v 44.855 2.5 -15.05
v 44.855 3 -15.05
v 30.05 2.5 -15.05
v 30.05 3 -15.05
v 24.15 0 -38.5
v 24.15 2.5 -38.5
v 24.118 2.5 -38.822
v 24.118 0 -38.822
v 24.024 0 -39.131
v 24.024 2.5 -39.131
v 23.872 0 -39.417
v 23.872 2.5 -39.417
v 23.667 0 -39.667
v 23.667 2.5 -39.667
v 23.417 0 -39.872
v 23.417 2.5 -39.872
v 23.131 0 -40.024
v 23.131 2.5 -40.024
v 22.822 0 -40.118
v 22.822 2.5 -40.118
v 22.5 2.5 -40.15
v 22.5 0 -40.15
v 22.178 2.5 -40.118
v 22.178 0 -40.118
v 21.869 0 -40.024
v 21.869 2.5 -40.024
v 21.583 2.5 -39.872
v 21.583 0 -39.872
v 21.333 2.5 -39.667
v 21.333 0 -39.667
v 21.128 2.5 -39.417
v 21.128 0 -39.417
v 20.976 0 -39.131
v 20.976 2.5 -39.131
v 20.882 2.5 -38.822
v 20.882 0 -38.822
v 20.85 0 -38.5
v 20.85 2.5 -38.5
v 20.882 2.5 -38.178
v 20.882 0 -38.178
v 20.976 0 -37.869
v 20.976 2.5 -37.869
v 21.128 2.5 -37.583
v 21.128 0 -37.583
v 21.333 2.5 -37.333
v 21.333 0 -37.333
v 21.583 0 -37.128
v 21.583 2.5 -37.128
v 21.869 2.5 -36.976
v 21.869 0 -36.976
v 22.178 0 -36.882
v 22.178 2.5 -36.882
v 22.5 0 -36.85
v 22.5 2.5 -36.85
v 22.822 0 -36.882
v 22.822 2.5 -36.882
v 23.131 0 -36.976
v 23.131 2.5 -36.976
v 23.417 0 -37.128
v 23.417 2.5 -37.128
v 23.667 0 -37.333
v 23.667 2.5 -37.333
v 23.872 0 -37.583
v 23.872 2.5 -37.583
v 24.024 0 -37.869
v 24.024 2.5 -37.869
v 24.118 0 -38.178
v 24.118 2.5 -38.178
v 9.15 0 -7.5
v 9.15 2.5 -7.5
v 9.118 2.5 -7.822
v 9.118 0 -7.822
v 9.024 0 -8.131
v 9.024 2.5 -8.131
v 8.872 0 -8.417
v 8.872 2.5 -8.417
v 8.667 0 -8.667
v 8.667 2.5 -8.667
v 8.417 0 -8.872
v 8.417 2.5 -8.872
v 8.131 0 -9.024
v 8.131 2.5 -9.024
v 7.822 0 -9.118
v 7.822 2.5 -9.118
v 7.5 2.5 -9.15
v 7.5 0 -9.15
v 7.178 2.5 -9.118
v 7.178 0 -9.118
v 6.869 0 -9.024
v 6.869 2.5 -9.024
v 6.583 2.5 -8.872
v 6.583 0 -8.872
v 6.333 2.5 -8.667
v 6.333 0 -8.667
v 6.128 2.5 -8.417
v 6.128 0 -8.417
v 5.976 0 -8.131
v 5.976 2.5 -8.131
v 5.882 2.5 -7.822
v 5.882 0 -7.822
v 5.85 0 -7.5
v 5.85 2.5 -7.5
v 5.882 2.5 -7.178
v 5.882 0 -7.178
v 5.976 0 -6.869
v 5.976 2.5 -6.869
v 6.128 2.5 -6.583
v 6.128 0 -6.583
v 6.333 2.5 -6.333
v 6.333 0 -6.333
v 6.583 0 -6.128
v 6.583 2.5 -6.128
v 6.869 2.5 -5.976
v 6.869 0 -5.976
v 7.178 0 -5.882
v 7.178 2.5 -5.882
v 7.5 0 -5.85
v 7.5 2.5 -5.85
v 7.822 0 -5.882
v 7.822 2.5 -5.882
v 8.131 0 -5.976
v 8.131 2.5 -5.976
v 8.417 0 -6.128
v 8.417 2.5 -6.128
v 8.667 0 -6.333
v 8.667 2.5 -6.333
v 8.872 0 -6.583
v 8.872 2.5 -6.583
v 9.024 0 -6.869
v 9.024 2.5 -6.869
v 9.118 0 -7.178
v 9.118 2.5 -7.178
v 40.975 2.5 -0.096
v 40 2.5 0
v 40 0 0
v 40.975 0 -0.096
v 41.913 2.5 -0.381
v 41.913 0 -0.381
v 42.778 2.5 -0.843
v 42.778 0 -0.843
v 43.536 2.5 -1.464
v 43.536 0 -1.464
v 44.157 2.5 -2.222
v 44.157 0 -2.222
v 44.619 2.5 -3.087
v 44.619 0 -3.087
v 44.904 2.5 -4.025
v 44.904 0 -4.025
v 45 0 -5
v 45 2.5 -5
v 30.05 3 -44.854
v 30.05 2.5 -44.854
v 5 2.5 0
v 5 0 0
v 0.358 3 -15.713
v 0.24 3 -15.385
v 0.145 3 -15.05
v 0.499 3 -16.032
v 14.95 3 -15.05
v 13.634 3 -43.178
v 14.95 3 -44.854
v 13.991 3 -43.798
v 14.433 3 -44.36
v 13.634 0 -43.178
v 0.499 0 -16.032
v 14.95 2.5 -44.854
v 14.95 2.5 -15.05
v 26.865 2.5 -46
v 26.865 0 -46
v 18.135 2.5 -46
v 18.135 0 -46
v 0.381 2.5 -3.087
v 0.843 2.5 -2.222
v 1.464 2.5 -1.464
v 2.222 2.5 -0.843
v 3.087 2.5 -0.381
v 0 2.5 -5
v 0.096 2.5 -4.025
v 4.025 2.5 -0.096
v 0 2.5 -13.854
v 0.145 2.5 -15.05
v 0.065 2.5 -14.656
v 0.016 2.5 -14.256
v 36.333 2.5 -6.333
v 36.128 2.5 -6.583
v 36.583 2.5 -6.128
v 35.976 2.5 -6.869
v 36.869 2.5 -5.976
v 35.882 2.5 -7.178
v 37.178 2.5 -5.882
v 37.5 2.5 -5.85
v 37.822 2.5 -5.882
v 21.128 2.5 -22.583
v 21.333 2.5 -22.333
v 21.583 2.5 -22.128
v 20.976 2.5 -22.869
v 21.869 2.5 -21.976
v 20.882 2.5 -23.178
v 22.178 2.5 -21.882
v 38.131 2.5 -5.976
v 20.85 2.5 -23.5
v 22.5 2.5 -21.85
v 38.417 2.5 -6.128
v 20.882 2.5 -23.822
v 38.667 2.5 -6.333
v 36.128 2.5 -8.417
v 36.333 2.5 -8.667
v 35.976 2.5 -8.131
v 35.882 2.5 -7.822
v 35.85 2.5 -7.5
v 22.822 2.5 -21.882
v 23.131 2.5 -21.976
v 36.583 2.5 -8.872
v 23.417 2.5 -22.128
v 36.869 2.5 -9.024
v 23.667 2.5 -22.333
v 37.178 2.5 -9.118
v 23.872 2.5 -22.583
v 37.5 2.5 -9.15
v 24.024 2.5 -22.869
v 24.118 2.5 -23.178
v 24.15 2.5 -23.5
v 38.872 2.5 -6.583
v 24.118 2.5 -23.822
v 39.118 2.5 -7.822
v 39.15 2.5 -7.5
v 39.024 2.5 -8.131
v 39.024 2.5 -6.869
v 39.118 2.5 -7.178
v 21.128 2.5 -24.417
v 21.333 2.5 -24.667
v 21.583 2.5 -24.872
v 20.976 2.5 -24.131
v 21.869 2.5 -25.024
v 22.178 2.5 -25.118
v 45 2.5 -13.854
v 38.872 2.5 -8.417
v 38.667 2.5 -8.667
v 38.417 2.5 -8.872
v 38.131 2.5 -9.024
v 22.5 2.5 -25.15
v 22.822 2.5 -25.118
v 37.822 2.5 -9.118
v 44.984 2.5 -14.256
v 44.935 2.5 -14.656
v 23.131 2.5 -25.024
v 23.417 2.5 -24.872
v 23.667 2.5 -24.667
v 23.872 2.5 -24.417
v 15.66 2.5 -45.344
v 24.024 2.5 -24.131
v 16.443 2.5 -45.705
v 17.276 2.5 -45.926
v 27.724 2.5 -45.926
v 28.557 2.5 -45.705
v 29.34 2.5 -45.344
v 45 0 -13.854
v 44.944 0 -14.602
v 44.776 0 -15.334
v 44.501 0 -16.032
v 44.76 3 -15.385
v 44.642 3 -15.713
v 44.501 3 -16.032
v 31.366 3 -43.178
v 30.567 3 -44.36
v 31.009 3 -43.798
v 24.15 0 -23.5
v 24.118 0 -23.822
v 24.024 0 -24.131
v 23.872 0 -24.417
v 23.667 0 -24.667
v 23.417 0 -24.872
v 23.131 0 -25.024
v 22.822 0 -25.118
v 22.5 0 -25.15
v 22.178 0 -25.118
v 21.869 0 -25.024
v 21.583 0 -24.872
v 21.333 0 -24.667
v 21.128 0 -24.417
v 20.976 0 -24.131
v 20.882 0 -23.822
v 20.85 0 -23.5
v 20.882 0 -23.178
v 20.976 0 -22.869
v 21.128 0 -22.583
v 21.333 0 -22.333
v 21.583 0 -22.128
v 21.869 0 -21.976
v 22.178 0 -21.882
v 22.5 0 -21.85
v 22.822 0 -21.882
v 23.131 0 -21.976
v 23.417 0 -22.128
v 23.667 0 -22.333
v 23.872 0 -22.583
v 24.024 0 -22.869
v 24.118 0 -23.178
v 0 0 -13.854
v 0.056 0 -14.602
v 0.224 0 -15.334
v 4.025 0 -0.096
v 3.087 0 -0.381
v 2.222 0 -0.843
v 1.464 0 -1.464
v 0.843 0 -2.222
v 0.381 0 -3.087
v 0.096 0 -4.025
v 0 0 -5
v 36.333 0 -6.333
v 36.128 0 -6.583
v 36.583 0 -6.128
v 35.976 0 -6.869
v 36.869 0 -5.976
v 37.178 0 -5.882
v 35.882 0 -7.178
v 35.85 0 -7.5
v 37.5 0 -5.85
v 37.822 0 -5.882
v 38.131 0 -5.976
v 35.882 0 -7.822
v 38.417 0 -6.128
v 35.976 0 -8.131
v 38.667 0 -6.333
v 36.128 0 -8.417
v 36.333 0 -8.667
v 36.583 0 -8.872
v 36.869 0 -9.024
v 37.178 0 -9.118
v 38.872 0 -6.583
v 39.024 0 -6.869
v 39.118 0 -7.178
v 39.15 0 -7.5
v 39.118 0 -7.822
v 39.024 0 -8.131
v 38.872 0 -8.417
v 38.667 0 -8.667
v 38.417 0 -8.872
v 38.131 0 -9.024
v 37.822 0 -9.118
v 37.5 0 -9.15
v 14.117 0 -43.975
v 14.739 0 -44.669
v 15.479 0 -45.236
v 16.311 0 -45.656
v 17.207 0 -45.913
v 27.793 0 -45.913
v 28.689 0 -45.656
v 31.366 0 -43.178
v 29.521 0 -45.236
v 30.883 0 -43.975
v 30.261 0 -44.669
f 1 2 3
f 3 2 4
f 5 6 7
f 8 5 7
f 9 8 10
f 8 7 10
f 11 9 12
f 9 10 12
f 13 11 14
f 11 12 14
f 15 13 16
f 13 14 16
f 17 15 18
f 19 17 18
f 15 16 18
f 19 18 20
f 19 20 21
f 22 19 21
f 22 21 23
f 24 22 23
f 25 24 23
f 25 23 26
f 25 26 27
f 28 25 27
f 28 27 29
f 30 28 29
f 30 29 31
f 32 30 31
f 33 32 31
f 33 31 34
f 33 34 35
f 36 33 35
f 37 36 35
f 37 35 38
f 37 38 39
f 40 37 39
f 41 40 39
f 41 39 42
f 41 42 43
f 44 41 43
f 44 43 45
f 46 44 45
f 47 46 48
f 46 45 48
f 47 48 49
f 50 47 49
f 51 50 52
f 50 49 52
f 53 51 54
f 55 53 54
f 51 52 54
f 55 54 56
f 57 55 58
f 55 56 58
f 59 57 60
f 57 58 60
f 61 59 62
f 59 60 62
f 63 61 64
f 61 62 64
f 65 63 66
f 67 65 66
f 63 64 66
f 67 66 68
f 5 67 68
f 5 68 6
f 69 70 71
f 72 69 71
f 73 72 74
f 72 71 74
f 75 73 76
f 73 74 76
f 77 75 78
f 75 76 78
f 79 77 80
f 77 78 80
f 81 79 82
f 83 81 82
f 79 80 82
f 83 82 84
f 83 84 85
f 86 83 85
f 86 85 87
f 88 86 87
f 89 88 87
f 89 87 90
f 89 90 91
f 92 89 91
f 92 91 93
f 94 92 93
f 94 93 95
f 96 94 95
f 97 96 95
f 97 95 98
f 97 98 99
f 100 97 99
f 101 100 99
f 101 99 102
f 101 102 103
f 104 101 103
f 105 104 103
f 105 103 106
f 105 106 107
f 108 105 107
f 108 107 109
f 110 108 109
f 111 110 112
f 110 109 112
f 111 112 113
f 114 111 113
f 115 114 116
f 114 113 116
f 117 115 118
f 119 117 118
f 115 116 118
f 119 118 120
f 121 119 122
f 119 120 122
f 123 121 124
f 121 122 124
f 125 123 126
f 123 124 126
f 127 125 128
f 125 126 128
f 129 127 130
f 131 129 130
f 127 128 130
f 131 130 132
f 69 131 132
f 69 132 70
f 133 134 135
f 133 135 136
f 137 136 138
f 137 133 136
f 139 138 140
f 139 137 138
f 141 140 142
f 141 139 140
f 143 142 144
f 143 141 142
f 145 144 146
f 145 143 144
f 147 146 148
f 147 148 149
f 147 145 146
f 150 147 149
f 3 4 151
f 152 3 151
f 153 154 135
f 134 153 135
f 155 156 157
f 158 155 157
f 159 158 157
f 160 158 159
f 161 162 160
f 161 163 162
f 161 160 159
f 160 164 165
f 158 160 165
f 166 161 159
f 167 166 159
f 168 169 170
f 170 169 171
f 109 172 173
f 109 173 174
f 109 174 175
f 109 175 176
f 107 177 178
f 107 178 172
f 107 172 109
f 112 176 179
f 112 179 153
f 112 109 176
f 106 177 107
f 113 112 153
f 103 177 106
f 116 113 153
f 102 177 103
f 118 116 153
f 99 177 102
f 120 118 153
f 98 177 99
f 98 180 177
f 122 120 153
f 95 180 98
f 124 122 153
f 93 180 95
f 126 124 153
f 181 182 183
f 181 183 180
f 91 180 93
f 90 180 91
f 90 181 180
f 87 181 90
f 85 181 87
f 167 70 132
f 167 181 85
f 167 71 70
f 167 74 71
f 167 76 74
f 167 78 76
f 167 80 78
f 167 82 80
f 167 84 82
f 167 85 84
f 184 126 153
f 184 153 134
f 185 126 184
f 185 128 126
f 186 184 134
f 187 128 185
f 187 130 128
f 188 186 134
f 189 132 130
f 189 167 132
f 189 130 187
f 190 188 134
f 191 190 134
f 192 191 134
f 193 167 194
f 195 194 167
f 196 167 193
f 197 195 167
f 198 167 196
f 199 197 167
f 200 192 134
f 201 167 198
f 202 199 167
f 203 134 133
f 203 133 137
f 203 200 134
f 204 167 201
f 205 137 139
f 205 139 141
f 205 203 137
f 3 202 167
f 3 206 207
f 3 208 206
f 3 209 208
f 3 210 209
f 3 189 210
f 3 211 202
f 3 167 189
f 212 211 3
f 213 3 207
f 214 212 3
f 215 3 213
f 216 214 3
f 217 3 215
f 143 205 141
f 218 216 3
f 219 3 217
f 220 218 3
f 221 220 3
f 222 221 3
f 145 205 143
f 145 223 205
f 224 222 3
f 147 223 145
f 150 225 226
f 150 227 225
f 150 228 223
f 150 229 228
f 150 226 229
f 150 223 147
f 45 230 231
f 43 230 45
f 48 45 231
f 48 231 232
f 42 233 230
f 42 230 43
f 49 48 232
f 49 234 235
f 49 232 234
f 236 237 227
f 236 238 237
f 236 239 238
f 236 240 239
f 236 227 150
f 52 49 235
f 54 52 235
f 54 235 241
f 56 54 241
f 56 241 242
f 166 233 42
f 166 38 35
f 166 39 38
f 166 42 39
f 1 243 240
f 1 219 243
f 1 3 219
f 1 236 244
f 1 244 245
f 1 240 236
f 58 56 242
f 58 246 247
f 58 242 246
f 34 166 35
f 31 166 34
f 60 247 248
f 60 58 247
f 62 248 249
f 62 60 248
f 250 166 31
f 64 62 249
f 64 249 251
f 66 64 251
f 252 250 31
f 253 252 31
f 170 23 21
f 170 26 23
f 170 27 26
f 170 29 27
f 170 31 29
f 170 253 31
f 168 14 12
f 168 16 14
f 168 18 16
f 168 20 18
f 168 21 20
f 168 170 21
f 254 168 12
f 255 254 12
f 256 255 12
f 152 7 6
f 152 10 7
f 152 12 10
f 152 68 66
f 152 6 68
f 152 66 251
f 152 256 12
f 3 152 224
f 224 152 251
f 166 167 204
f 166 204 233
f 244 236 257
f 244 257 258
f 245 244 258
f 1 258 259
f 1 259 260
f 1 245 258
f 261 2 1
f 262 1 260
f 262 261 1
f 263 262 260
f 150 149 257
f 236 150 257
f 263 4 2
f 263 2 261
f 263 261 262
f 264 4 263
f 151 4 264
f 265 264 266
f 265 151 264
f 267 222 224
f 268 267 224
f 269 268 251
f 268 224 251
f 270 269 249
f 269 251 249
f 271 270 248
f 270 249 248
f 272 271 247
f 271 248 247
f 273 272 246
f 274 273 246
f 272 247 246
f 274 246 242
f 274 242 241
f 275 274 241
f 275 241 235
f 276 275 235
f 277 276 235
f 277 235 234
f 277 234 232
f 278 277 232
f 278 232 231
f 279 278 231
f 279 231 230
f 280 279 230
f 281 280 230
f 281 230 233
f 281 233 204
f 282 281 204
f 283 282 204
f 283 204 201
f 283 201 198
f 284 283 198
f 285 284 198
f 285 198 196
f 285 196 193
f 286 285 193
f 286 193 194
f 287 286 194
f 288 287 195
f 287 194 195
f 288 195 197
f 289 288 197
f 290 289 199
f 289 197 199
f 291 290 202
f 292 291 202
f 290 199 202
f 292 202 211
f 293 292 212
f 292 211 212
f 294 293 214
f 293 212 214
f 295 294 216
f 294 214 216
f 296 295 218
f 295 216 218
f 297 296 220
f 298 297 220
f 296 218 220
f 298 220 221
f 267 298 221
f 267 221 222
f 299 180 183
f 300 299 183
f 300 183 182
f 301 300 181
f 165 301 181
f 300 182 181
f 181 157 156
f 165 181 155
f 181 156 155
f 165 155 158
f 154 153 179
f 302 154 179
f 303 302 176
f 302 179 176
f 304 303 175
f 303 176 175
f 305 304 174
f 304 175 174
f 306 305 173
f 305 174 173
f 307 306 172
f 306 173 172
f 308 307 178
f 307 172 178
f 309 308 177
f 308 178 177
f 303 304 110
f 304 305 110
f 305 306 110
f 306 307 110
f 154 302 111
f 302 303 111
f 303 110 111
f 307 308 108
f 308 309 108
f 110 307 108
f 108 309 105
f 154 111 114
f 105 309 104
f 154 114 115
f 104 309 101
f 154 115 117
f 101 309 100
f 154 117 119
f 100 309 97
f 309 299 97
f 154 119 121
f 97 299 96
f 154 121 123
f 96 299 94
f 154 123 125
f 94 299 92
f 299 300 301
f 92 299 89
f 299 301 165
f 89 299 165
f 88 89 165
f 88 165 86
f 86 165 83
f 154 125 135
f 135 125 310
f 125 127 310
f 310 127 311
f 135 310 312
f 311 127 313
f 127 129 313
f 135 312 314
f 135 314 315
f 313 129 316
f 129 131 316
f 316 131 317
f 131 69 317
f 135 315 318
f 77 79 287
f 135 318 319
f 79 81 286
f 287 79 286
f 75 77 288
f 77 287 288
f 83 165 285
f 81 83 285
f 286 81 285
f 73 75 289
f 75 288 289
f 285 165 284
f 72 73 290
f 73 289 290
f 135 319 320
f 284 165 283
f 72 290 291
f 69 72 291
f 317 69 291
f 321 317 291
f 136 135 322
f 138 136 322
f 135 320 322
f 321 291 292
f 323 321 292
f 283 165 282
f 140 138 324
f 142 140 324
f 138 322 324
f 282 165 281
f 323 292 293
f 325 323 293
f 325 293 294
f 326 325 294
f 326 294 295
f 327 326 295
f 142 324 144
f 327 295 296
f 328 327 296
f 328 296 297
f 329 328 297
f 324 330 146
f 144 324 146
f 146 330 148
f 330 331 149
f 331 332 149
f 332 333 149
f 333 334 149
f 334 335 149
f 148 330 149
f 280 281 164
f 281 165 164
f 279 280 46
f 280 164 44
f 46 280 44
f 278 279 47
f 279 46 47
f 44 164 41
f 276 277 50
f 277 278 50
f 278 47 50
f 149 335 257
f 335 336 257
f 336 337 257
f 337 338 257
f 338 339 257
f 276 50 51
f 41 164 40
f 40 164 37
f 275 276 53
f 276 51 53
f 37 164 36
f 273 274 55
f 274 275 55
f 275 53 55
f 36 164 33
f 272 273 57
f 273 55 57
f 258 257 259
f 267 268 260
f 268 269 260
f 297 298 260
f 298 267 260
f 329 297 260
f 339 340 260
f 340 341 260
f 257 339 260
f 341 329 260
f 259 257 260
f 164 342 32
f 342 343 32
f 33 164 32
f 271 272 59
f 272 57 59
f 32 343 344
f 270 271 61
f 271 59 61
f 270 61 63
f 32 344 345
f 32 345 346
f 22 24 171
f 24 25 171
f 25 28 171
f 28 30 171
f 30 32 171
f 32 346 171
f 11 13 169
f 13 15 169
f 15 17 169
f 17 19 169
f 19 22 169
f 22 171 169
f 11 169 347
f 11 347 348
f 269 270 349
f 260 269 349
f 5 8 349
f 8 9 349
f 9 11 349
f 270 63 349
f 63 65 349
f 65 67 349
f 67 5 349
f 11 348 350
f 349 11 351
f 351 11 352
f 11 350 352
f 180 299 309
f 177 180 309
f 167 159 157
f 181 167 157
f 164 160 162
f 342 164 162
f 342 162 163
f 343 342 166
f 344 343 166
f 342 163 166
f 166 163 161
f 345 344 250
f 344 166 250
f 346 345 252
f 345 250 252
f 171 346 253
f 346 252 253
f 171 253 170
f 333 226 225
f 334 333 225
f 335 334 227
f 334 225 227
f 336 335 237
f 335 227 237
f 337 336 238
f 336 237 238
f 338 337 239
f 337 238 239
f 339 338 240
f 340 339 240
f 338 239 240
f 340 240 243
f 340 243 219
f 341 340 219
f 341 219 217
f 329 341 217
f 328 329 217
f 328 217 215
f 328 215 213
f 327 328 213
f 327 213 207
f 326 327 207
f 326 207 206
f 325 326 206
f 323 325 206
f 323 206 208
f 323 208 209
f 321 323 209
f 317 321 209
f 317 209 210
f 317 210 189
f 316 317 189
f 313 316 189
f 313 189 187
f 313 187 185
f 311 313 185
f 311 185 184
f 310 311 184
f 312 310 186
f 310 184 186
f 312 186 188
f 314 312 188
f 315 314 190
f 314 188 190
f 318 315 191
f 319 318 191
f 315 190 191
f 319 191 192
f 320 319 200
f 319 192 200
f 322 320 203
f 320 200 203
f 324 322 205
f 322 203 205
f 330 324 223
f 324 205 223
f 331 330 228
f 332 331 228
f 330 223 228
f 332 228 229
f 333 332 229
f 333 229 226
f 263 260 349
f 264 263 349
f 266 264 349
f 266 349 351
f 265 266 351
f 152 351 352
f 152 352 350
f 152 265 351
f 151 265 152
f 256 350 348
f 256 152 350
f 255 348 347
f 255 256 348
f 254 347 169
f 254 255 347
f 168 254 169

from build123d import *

# Parameters (mm, degrees)
EXTRUDE_1_DEPTH     = 3
SKETCH_2_R          = 1.65
CUT_EXTRUDE_1_DEPTH = 3
FILLET_1_R          = 5
CUT_EXTRUDE_2_DEPTH = 0.5


with BuildPart() as part:
    # ｽｹｯﾁ1 → ﾎﾞｽ - 押し出し1 (new body)
    with BuildSketch(Plane(origin=(0, 0, 0), x_dir=(1, 0, 0), z_dir=(0, 1, 0))):
        Polygon((0, 0), (45, 0), (45, 15), (30, 46), (15, 46), (0, 15), align=None)
    extrude(amount=EXTRUDE_1_DEPTH)

    # ｽｹｯﾁ2 → ｶｯﾄ - 押し出し1 (cut)
    with BuildSketch(Plane(origin=(0, 3, 0), x_dir=(1, 0, 0), z_dir=(0, 1, 0))):
        with Locations((7.5, 7.5)):
            Circle(SKETCH_2_R)
        with Locations((22.5, 38.5)):
            Circle(SKETCH_2_R)
        with Locations((22.5, 23.5)):
            Circle(SKETCH_2_R)
        with Locations((37.5, 7.5)):
            Circle(SKETCH_2_R)
    extrude(amount=-CUT_EXTRUDE_1_DEPTH, mode=Mode.SUBTRACT)

    # ﾌｨﾚｯﾄ1
    fillet_1_edges = [part.edges().sort_by_distance(p)[0] for p in [
        (0, 1.5, -15),
        (15, 1.5, -46),
        (30, 1.5, -46),
        (45, 1.5, -15),
        (45, 1.5, 0),
        (0, 1.5, 0),
    ]]
    fillet(fillet_1_edges, radius=FILLET_1_R)

    # ｽｹｯﾁ3 → ｶｯﾄ - 押し出し2 (cut)
    with BuildSketch(Plane(origin=(0, 3, 0), x_dir=(1, 0, 0), z_dir=(0, 1, 0))):
        Polygon((0, 0), (45, 0), (45, 15.05), (30.05, 15.05), (30.05, 46), (14.95, 46), (14.95, 15.05), (0, 15.05), align=None)
    extrude(amount=-CUT_EXTRUDE_2_DEPTH, mode=Mode.SUBTRACT)


solid = part.part
